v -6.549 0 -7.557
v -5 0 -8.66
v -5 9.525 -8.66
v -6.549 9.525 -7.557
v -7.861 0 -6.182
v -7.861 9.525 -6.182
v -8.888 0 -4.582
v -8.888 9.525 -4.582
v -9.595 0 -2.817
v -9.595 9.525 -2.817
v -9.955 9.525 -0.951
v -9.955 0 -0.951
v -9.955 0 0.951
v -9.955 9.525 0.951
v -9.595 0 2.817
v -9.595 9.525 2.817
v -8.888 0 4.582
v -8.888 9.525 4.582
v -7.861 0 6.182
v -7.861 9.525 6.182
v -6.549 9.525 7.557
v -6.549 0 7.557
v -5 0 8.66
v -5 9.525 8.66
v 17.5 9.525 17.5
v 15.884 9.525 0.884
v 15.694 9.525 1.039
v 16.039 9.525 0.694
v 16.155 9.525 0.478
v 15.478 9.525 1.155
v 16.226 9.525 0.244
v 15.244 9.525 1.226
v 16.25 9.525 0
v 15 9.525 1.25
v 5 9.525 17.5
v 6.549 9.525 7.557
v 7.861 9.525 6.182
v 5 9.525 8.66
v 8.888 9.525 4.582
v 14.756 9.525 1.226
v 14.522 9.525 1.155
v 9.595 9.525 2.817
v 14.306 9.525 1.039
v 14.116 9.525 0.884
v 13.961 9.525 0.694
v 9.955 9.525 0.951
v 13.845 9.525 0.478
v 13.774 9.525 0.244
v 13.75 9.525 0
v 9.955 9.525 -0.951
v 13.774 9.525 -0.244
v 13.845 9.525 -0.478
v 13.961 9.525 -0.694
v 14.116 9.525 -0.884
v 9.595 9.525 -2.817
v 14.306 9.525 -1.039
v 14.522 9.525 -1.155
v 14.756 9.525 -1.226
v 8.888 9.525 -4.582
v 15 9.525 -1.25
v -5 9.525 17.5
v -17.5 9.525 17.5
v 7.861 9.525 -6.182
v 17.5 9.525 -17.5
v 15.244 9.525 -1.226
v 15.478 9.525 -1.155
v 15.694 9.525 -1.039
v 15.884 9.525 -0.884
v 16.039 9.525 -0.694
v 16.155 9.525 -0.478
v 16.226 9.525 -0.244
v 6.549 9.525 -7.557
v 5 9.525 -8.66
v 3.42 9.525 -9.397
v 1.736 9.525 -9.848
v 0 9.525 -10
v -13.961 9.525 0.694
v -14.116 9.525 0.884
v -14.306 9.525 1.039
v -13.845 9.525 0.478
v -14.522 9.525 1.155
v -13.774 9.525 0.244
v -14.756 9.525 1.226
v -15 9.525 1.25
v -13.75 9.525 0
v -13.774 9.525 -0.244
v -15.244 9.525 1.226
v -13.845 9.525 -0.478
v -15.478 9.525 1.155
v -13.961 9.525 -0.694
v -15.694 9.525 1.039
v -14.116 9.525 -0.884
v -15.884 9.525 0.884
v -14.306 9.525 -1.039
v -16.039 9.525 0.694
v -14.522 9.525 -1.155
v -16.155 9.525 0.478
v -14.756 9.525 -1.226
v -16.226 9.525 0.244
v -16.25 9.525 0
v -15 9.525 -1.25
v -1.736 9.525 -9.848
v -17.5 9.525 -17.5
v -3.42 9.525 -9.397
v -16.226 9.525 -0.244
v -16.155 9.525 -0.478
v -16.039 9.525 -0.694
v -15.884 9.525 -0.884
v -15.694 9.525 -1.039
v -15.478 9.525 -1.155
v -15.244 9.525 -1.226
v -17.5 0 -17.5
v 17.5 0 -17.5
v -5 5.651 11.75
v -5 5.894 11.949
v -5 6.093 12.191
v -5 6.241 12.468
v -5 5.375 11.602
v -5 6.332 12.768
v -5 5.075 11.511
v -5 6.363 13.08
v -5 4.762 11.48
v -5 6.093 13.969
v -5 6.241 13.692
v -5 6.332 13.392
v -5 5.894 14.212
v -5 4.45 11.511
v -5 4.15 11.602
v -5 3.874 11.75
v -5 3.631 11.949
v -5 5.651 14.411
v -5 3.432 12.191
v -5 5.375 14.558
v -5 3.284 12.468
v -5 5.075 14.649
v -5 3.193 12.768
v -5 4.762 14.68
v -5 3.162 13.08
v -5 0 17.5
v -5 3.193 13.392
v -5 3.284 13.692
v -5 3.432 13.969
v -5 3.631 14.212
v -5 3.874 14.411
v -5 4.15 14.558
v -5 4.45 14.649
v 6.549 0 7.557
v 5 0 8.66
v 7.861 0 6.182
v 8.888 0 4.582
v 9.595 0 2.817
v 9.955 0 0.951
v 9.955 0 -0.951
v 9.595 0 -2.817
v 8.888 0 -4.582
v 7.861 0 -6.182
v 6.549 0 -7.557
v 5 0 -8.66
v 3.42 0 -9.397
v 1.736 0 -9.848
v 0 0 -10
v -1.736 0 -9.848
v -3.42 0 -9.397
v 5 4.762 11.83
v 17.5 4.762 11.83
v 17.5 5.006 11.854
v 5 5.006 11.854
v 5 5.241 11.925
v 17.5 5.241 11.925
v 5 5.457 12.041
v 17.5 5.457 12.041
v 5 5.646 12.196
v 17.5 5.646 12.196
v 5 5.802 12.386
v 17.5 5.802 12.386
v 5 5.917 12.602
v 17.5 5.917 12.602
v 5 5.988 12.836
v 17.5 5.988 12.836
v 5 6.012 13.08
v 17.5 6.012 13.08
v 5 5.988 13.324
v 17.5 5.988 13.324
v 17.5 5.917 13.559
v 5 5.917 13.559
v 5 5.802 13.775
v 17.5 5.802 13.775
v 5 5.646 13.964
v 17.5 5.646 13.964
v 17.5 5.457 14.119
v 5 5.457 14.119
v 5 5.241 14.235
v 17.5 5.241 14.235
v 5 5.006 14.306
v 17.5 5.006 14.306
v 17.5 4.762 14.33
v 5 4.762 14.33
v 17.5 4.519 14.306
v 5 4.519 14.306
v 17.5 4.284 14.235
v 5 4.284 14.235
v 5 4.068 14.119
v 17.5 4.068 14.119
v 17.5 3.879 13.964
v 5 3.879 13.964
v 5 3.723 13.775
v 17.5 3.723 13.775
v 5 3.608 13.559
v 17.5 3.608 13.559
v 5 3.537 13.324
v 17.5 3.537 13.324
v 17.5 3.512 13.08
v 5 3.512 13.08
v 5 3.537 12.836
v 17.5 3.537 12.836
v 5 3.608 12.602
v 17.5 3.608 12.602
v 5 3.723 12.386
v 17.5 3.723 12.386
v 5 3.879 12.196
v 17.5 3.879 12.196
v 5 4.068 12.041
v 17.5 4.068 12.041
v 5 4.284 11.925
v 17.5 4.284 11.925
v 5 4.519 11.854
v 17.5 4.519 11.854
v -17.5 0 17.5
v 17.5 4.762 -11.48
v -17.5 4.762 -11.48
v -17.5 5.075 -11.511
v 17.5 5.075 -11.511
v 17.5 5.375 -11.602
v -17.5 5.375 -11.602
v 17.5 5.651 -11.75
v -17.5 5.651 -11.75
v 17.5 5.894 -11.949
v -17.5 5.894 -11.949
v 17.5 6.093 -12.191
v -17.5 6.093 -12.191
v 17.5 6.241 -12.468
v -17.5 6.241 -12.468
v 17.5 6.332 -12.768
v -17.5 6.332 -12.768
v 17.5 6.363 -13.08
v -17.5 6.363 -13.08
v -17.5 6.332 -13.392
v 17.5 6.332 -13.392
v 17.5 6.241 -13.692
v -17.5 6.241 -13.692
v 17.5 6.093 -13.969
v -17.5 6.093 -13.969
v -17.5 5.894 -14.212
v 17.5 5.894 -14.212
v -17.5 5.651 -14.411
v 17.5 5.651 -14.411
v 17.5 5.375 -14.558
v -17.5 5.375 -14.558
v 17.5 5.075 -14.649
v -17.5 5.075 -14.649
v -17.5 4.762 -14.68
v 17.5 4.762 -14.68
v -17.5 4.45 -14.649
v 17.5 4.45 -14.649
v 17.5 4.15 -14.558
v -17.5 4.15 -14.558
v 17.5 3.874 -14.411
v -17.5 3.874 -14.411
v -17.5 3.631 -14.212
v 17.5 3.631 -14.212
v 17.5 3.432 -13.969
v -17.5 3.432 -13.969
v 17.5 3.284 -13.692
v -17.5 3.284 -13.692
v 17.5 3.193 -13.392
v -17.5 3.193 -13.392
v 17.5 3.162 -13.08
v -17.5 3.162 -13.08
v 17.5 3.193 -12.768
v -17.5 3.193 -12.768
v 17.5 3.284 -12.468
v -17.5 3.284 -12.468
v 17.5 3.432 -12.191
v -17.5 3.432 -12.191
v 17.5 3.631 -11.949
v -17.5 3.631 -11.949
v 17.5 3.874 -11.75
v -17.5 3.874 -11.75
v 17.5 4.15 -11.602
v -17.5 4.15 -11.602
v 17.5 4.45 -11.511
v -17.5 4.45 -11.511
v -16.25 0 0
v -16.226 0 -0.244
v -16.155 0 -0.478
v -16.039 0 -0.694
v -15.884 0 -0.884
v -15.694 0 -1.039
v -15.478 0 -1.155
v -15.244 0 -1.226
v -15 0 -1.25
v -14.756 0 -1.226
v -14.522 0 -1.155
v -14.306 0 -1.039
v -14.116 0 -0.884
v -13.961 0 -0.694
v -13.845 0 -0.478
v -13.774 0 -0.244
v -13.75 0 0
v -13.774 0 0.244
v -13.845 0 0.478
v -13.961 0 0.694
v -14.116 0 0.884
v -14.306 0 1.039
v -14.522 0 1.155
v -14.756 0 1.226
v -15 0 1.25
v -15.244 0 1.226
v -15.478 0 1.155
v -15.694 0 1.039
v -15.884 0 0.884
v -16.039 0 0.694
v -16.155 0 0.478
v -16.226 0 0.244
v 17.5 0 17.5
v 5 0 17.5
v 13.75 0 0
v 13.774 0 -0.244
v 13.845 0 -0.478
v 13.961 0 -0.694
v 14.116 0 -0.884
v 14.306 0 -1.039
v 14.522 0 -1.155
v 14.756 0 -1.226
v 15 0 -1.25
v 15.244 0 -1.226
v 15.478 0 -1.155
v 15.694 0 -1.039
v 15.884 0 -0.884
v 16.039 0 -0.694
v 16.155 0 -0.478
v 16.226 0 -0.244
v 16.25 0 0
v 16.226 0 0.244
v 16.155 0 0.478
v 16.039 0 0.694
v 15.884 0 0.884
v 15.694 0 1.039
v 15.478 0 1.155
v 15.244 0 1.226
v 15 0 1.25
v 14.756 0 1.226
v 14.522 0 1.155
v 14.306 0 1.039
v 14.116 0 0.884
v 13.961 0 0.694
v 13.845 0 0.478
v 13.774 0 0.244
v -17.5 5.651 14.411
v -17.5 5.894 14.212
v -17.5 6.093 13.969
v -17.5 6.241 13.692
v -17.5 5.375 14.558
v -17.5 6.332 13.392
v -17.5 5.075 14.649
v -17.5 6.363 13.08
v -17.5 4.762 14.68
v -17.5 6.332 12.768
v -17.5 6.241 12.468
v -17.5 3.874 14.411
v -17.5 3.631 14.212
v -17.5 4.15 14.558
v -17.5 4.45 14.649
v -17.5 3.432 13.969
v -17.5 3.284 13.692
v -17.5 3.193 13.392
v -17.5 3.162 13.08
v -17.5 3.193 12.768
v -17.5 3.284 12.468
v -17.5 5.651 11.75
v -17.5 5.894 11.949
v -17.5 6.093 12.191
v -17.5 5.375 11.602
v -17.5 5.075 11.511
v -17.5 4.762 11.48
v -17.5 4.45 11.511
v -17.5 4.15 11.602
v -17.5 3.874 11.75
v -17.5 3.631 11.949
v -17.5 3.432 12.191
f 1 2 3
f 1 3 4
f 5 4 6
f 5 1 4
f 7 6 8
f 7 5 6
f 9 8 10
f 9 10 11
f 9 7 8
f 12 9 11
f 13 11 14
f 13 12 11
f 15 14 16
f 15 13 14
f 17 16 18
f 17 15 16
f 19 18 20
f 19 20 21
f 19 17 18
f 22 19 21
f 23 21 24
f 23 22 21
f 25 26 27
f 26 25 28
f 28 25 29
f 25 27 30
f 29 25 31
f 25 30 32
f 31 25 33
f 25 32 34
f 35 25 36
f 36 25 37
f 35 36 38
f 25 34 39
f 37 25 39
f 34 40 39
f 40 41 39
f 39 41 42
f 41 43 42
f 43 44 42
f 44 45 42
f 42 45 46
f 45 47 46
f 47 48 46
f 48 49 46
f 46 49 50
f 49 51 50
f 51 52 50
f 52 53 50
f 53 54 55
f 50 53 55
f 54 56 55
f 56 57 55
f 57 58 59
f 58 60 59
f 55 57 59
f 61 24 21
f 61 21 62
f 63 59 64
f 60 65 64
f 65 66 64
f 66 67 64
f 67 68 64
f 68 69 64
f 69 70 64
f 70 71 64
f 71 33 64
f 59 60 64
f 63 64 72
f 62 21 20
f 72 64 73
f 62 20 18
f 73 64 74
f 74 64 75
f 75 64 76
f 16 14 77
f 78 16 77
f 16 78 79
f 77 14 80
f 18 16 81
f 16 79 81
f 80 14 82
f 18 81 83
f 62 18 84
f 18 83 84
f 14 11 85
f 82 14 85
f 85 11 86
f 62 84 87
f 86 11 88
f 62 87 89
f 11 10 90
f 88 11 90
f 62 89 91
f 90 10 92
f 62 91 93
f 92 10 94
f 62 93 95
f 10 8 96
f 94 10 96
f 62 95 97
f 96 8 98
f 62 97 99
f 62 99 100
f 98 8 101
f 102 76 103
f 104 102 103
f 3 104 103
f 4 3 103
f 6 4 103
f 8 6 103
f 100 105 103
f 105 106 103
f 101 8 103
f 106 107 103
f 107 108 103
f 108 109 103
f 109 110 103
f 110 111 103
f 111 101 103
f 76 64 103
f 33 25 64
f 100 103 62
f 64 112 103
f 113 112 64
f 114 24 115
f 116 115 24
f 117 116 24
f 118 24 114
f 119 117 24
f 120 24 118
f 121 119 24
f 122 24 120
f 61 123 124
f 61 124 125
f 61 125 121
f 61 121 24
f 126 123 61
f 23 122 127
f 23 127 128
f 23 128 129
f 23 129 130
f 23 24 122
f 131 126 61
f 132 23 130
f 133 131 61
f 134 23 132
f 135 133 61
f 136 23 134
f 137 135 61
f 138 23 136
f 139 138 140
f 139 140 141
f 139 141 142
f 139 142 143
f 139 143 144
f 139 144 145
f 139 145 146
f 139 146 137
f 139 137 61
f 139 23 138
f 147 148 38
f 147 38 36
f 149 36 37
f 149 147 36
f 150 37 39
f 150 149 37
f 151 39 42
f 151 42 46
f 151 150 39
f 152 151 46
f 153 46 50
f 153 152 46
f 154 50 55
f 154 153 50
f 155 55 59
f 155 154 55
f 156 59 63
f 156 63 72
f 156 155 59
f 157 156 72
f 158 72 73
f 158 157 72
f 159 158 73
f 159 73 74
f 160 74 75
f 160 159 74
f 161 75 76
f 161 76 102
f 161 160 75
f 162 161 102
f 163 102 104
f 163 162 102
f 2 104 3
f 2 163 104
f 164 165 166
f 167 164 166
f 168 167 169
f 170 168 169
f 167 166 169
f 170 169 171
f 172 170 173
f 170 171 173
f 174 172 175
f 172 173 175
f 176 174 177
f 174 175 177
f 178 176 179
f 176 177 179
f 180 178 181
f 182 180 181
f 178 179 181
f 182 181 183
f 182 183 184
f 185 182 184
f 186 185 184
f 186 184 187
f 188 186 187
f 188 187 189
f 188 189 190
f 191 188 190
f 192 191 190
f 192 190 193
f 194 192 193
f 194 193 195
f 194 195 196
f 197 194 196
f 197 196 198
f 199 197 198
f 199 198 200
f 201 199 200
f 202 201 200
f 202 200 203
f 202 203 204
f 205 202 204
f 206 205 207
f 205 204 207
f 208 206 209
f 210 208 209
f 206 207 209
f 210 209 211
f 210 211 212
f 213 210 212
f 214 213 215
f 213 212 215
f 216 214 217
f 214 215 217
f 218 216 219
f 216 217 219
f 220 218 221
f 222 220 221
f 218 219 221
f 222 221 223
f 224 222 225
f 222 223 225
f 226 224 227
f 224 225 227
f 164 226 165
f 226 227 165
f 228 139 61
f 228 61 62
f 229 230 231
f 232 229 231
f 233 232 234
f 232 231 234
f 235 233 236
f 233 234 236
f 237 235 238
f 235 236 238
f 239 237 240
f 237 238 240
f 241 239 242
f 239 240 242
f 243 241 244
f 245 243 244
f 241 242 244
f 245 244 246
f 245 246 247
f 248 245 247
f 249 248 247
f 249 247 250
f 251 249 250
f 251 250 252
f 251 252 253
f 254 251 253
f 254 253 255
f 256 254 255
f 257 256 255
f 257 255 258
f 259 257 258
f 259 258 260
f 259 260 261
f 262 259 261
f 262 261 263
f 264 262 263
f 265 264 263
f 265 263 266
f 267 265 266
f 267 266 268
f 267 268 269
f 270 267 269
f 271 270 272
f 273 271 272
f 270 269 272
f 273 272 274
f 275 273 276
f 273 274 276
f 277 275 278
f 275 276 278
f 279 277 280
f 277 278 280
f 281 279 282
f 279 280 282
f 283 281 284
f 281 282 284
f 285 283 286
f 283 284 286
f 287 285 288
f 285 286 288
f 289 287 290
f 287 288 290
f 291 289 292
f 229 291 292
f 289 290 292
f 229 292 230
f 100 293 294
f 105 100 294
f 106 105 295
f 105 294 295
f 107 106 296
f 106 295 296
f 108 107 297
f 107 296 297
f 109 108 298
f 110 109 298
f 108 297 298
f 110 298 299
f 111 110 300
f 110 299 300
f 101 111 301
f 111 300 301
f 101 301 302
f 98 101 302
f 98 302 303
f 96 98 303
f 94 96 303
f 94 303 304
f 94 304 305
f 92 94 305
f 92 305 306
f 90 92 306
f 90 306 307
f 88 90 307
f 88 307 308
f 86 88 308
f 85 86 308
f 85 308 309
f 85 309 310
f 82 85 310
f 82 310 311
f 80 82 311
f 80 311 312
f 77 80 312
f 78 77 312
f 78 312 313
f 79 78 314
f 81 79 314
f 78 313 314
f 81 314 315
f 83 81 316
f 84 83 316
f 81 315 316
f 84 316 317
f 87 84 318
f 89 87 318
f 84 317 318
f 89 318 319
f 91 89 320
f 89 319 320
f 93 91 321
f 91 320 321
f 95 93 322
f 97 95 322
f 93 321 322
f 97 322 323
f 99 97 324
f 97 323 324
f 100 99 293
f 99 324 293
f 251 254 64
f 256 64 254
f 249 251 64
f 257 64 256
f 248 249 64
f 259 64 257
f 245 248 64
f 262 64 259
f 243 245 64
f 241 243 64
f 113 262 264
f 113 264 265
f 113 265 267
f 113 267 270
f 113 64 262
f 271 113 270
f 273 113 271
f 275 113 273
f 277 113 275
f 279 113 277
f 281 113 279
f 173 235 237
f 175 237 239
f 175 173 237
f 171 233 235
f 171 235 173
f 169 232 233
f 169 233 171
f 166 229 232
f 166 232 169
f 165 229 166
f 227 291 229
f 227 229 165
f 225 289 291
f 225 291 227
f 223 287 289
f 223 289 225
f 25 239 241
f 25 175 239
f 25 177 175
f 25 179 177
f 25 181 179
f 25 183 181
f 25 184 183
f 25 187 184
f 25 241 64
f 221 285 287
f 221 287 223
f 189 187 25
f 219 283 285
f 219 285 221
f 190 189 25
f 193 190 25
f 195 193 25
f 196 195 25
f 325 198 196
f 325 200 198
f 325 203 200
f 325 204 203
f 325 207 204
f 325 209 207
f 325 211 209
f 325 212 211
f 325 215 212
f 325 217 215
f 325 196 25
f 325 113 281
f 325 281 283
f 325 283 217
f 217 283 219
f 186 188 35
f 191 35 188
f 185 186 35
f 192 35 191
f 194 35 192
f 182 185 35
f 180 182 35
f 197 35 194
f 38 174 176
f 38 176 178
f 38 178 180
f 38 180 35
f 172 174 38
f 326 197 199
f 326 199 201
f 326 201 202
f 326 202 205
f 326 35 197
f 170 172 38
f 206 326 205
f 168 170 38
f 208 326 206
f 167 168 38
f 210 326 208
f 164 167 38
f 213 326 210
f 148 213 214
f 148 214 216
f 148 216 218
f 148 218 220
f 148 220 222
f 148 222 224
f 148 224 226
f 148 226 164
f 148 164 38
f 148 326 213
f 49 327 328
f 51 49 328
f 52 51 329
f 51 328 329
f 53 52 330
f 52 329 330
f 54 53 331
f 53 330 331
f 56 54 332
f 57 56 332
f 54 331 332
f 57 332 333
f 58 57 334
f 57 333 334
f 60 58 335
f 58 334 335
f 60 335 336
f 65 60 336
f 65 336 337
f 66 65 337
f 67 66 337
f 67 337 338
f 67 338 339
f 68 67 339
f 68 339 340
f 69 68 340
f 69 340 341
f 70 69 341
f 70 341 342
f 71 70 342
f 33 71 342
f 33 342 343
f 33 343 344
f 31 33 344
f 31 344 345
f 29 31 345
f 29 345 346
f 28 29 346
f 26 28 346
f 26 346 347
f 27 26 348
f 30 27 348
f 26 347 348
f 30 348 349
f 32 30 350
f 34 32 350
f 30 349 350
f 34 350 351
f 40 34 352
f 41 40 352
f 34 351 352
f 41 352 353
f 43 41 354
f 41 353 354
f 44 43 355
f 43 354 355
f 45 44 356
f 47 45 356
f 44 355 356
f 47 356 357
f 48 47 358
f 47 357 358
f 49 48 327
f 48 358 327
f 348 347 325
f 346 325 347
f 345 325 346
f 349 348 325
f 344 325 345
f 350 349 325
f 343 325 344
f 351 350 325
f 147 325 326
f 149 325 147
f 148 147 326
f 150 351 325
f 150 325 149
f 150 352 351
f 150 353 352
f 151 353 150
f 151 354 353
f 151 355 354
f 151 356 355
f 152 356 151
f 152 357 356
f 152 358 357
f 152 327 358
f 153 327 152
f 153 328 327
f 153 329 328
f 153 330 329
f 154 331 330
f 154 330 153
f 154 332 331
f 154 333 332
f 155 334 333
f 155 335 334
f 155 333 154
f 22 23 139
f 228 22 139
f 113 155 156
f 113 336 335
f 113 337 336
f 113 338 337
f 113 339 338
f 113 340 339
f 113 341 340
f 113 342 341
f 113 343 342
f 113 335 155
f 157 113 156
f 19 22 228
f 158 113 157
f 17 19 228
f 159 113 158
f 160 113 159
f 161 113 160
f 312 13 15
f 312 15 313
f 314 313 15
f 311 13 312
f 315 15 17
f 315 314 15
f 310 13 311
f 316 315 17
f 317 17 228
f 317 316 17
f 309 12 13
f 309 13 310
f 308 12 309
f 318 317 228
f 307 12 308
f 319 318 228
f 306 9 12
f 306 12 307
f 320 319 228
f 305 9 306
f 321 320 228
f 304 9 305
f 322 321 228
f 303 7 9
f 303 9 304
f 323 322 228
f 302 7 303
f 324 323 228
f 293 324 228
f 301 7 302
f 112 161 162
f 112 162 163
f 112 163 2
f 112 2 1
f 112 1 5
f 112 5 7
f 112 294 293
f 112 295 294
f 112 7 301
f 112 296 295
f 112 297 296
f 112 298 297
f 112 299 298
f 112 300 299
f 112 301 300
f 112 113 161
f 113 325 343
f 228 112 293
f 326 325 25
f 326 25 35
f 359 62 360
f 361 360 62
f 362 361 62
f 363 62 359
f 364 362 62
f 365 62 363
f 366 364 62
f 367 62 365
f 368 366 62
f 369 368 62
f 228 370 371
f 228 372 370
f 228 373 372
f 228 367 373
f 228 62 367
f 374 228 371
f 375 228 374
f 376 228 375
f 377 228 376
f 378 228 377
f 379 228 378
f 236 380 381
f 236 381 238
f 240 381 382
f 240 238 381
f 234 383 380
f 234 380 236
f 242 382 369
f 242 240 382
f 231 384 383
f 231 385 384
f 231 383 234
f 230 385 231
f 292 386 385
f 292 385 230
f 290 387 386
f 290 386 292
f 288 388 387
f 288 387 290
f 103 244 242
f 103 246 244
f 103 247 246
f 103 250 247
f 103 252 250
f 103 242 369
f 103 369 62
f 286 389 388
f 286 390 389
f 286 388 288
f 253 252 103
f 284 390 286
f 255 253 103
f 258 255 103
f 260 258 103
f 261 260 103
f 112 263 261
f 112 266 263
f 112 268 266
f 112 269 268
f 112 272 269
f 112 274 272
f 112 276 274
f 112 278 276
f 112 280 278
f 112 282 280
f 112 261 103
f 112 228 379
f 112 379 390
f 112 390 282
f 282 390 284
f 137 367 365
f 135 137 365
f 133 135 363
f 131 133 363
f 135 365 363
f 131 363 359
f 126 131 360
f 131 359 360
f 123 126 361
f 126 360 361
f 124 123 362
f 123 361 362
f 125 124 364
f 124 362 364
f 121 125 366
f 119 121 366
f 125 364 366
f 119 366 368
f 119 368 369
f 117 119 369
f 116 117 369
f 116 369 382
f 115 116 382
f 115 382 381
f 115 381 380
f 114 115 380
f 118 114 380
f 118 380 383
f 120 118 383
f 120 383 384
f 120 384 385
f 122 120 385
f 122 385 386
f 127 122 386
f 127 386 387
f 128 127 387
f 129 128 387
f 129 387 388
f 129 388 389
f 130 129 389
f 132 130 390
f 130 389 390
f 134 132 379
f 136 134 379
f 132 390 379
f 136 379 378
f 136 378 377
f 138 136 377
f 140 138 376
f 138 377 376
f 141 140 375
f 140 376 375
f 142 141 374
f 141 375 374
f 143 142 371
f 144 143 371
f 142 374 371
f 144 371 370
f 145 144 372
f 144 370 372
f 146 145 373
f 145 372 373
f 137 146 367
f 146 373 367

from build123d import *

# Parameters (mm, degrees)
BOSS_EXTRUDE1_DEPTH              = 9.525
TAP_DRILL_FOR_M3X0_5_TAP1_D      = 2.5
TAP_DRILL_FOR_M3X0_5_TAP2_D      = 2.5
TAP_DRILL_FOR_M3X0_5_TAP3_REACH  = 42.274
TAP_DRILL_FOR_M3X0_5_TAP3_BORE_R = 1.25
M3_CLEARANCE_HOLE1_REACH         = 42.274
M3_CLEARANCE_HOLE1_BORE_R        = 1.6


with BuildPart() as part:
    # Sketch1 → Boss-Extrude1 (new body)
    with BuildSketch(Plane(origin=(0, 0, 0), x_dir=(1, 0, 0), z_dir=(0, 1, 0))):
        with BuildLine():
            Line((-17.5, 17.5), (-5, 17.5))
            Line((-5, 17.5), (5, 17.5))
            Line((5, 17.5), (17.5, 17.5))
            Line((17.5, 17.5), (17.5, -17.5))
            Line((17.5, -17.5), (5, -17.5))
            Line((5, -17.5), (5, -8.660254038))
            ThreePointArc((5, -8.660254038), (10, 0), (5, 8.660254038))
            ThreePointArc((5, 8.660254038), (0, 10), (-5, 8.660254038))
            ThreePointArc((-5, 8.660254038), (-10, 0), (-5, -8.660254038))
            Line((-5, -8.660254038), (-5, -17.5))
            Line((-5, -17.5), (-17.5, -17.5))
            Line((-17.5, -17.5), (-17.5, 17.5))
        make_face()
    extrude(amount=BOSS_EXTRUDE1_DEPTH)

    # Tap Drill for M3x0.5 Tap1 (through all)
    with Locations(Plane(origin=(0, 9.525, 0), x_dir=(1, 0, 0), z_dir=(0, 1, 0))):
        with Locations((-15, 0)):
            Hole(TAP_DRILL_FOR_M3X0_5_TAP1_D / 2)

    # Tap Drill for M3x0.5 Tap2 (through all)
    with Locations(Plane(origin=(0, 9.525, 0), x_dir=(1, 0, 0), z_dir=(0, 1, 0))):
        with Locations((15, 0)):
            Hole(TAP_DRILL_FOR_M3X0_5_TAP2_D / 2)

    # Tap Drill for M3x0.5 Tap3 bore → Tap Drill for M3x0.5 Tap3 (cut, up to next)
    with BuildSketch(Plane(origin=(17.5, 0, 0), x_dir=(0, 0, -1), z_dir=(1, 0, 0)), mode=Mode.PRIVATE) as tap_drill_for_m3x0_5_tap3_sk1:
        with Locations((13.08015, 4.7625)):
            Circle(TAP_DRILL_FOR_M3X0_5_TAP3_BORE_R)
    tap_drill_for_m3x0_5_tap3_tool1 = extrude(tap_drill_for_m3x0_5_tap3_sk1.sketch, amount=-TAP_DRILL_FOR_M3X0_5_TAP3_REACH, mode=Mode.PRIVATE) & part.part
    # Tap Drill for M3x0.5 Tap3 bore → Tap Drill for M3x0.5 Tap3 (cut, up to next)
    with BuildSketch(Plane(origin=(17.5, 0, 0), x_dir=(0, 0, -1), z_dir=(1, 0, 0)), mode=Mode.PRIVATE) as tap_drill_for_m3x0_5_tap3_sk2:
        with Locations((-13.08015, 4.7625)):
            Circle(TAP_DRILL_FOR_M3X0_5_TAP3_BORE_R)
    tap_drill_for_m3x0_5_tap3_tool2 = extrude(tap_drill_for_m3x0_5_tap3_sk2.sketch, amount=-TAP_DRILL_FOR_M3X0_5_TAP3_REACH, mode=Mode.PRIVATE) & part.part
    add(tap_drill_for_m3x0_5_tap3_tool1.solids().sort_by_distance((17.5, 4.7625, -13.08015))[0], mode=Mode.SUBTRACT)
    add(tap_drill_for_m3x0_5_tap3_tool2.solids().sort_by_distance((17.5, 4.7625, 13.08015))[0], mode=Mode.SUBTRACT)

    # M3 Clearance Hole1 bore → M3 Clearance Hole1 (cut, up to next)
    with BuildSketch(Plane.ZY.offset(17.5), mode=Mode.PRIVATE) as m3_clearance_hole1_sk1:
        with Locations((-13.08015, 4.7625)):
            Circle(M3_CLEARANCE_HOLE1_BORE_R)
    m3_clearance_hole1_tool1 = extrude(m3_clearance_hole1_sk1.sketch, amount=-M3_CLEARANCE_HOLE1_REACH, mode=Mode.PRIVATE) & part.part
    # M3 Clearance Hole1 bore → M3 Clearance Hole1 (cut, up to next)
    with BuildSketch(Plane.ZY.offset(17.5), mode=Mode.PRIVATE) as m3_clearance_hole1_sk2:
        with Locations((13.08015, 4.7625)):
            Circle(M3_CLEARANCE_HOLE1_BORE_R)
    m3_clearance_hole1_tool2 = extrude(m3_clearance_hole1_sk2.sketch, amount=-M3_CLEARANCE_HOLE1_REACH, mode=Mode.PRIVATE) & part.part
    add(m3_clearance_hole1_tool1.solids().sort_by_distance((-17.5, 4.7625, -13.08015))[0], mode=Mode.SUBTRACT)
    add(m3_clearance_hole1_tool2.solids().sort_by_distance((-17.5, 4.7625, 13.08015))[0], mode=Mode.SUBTRACT)


solid = part.part
